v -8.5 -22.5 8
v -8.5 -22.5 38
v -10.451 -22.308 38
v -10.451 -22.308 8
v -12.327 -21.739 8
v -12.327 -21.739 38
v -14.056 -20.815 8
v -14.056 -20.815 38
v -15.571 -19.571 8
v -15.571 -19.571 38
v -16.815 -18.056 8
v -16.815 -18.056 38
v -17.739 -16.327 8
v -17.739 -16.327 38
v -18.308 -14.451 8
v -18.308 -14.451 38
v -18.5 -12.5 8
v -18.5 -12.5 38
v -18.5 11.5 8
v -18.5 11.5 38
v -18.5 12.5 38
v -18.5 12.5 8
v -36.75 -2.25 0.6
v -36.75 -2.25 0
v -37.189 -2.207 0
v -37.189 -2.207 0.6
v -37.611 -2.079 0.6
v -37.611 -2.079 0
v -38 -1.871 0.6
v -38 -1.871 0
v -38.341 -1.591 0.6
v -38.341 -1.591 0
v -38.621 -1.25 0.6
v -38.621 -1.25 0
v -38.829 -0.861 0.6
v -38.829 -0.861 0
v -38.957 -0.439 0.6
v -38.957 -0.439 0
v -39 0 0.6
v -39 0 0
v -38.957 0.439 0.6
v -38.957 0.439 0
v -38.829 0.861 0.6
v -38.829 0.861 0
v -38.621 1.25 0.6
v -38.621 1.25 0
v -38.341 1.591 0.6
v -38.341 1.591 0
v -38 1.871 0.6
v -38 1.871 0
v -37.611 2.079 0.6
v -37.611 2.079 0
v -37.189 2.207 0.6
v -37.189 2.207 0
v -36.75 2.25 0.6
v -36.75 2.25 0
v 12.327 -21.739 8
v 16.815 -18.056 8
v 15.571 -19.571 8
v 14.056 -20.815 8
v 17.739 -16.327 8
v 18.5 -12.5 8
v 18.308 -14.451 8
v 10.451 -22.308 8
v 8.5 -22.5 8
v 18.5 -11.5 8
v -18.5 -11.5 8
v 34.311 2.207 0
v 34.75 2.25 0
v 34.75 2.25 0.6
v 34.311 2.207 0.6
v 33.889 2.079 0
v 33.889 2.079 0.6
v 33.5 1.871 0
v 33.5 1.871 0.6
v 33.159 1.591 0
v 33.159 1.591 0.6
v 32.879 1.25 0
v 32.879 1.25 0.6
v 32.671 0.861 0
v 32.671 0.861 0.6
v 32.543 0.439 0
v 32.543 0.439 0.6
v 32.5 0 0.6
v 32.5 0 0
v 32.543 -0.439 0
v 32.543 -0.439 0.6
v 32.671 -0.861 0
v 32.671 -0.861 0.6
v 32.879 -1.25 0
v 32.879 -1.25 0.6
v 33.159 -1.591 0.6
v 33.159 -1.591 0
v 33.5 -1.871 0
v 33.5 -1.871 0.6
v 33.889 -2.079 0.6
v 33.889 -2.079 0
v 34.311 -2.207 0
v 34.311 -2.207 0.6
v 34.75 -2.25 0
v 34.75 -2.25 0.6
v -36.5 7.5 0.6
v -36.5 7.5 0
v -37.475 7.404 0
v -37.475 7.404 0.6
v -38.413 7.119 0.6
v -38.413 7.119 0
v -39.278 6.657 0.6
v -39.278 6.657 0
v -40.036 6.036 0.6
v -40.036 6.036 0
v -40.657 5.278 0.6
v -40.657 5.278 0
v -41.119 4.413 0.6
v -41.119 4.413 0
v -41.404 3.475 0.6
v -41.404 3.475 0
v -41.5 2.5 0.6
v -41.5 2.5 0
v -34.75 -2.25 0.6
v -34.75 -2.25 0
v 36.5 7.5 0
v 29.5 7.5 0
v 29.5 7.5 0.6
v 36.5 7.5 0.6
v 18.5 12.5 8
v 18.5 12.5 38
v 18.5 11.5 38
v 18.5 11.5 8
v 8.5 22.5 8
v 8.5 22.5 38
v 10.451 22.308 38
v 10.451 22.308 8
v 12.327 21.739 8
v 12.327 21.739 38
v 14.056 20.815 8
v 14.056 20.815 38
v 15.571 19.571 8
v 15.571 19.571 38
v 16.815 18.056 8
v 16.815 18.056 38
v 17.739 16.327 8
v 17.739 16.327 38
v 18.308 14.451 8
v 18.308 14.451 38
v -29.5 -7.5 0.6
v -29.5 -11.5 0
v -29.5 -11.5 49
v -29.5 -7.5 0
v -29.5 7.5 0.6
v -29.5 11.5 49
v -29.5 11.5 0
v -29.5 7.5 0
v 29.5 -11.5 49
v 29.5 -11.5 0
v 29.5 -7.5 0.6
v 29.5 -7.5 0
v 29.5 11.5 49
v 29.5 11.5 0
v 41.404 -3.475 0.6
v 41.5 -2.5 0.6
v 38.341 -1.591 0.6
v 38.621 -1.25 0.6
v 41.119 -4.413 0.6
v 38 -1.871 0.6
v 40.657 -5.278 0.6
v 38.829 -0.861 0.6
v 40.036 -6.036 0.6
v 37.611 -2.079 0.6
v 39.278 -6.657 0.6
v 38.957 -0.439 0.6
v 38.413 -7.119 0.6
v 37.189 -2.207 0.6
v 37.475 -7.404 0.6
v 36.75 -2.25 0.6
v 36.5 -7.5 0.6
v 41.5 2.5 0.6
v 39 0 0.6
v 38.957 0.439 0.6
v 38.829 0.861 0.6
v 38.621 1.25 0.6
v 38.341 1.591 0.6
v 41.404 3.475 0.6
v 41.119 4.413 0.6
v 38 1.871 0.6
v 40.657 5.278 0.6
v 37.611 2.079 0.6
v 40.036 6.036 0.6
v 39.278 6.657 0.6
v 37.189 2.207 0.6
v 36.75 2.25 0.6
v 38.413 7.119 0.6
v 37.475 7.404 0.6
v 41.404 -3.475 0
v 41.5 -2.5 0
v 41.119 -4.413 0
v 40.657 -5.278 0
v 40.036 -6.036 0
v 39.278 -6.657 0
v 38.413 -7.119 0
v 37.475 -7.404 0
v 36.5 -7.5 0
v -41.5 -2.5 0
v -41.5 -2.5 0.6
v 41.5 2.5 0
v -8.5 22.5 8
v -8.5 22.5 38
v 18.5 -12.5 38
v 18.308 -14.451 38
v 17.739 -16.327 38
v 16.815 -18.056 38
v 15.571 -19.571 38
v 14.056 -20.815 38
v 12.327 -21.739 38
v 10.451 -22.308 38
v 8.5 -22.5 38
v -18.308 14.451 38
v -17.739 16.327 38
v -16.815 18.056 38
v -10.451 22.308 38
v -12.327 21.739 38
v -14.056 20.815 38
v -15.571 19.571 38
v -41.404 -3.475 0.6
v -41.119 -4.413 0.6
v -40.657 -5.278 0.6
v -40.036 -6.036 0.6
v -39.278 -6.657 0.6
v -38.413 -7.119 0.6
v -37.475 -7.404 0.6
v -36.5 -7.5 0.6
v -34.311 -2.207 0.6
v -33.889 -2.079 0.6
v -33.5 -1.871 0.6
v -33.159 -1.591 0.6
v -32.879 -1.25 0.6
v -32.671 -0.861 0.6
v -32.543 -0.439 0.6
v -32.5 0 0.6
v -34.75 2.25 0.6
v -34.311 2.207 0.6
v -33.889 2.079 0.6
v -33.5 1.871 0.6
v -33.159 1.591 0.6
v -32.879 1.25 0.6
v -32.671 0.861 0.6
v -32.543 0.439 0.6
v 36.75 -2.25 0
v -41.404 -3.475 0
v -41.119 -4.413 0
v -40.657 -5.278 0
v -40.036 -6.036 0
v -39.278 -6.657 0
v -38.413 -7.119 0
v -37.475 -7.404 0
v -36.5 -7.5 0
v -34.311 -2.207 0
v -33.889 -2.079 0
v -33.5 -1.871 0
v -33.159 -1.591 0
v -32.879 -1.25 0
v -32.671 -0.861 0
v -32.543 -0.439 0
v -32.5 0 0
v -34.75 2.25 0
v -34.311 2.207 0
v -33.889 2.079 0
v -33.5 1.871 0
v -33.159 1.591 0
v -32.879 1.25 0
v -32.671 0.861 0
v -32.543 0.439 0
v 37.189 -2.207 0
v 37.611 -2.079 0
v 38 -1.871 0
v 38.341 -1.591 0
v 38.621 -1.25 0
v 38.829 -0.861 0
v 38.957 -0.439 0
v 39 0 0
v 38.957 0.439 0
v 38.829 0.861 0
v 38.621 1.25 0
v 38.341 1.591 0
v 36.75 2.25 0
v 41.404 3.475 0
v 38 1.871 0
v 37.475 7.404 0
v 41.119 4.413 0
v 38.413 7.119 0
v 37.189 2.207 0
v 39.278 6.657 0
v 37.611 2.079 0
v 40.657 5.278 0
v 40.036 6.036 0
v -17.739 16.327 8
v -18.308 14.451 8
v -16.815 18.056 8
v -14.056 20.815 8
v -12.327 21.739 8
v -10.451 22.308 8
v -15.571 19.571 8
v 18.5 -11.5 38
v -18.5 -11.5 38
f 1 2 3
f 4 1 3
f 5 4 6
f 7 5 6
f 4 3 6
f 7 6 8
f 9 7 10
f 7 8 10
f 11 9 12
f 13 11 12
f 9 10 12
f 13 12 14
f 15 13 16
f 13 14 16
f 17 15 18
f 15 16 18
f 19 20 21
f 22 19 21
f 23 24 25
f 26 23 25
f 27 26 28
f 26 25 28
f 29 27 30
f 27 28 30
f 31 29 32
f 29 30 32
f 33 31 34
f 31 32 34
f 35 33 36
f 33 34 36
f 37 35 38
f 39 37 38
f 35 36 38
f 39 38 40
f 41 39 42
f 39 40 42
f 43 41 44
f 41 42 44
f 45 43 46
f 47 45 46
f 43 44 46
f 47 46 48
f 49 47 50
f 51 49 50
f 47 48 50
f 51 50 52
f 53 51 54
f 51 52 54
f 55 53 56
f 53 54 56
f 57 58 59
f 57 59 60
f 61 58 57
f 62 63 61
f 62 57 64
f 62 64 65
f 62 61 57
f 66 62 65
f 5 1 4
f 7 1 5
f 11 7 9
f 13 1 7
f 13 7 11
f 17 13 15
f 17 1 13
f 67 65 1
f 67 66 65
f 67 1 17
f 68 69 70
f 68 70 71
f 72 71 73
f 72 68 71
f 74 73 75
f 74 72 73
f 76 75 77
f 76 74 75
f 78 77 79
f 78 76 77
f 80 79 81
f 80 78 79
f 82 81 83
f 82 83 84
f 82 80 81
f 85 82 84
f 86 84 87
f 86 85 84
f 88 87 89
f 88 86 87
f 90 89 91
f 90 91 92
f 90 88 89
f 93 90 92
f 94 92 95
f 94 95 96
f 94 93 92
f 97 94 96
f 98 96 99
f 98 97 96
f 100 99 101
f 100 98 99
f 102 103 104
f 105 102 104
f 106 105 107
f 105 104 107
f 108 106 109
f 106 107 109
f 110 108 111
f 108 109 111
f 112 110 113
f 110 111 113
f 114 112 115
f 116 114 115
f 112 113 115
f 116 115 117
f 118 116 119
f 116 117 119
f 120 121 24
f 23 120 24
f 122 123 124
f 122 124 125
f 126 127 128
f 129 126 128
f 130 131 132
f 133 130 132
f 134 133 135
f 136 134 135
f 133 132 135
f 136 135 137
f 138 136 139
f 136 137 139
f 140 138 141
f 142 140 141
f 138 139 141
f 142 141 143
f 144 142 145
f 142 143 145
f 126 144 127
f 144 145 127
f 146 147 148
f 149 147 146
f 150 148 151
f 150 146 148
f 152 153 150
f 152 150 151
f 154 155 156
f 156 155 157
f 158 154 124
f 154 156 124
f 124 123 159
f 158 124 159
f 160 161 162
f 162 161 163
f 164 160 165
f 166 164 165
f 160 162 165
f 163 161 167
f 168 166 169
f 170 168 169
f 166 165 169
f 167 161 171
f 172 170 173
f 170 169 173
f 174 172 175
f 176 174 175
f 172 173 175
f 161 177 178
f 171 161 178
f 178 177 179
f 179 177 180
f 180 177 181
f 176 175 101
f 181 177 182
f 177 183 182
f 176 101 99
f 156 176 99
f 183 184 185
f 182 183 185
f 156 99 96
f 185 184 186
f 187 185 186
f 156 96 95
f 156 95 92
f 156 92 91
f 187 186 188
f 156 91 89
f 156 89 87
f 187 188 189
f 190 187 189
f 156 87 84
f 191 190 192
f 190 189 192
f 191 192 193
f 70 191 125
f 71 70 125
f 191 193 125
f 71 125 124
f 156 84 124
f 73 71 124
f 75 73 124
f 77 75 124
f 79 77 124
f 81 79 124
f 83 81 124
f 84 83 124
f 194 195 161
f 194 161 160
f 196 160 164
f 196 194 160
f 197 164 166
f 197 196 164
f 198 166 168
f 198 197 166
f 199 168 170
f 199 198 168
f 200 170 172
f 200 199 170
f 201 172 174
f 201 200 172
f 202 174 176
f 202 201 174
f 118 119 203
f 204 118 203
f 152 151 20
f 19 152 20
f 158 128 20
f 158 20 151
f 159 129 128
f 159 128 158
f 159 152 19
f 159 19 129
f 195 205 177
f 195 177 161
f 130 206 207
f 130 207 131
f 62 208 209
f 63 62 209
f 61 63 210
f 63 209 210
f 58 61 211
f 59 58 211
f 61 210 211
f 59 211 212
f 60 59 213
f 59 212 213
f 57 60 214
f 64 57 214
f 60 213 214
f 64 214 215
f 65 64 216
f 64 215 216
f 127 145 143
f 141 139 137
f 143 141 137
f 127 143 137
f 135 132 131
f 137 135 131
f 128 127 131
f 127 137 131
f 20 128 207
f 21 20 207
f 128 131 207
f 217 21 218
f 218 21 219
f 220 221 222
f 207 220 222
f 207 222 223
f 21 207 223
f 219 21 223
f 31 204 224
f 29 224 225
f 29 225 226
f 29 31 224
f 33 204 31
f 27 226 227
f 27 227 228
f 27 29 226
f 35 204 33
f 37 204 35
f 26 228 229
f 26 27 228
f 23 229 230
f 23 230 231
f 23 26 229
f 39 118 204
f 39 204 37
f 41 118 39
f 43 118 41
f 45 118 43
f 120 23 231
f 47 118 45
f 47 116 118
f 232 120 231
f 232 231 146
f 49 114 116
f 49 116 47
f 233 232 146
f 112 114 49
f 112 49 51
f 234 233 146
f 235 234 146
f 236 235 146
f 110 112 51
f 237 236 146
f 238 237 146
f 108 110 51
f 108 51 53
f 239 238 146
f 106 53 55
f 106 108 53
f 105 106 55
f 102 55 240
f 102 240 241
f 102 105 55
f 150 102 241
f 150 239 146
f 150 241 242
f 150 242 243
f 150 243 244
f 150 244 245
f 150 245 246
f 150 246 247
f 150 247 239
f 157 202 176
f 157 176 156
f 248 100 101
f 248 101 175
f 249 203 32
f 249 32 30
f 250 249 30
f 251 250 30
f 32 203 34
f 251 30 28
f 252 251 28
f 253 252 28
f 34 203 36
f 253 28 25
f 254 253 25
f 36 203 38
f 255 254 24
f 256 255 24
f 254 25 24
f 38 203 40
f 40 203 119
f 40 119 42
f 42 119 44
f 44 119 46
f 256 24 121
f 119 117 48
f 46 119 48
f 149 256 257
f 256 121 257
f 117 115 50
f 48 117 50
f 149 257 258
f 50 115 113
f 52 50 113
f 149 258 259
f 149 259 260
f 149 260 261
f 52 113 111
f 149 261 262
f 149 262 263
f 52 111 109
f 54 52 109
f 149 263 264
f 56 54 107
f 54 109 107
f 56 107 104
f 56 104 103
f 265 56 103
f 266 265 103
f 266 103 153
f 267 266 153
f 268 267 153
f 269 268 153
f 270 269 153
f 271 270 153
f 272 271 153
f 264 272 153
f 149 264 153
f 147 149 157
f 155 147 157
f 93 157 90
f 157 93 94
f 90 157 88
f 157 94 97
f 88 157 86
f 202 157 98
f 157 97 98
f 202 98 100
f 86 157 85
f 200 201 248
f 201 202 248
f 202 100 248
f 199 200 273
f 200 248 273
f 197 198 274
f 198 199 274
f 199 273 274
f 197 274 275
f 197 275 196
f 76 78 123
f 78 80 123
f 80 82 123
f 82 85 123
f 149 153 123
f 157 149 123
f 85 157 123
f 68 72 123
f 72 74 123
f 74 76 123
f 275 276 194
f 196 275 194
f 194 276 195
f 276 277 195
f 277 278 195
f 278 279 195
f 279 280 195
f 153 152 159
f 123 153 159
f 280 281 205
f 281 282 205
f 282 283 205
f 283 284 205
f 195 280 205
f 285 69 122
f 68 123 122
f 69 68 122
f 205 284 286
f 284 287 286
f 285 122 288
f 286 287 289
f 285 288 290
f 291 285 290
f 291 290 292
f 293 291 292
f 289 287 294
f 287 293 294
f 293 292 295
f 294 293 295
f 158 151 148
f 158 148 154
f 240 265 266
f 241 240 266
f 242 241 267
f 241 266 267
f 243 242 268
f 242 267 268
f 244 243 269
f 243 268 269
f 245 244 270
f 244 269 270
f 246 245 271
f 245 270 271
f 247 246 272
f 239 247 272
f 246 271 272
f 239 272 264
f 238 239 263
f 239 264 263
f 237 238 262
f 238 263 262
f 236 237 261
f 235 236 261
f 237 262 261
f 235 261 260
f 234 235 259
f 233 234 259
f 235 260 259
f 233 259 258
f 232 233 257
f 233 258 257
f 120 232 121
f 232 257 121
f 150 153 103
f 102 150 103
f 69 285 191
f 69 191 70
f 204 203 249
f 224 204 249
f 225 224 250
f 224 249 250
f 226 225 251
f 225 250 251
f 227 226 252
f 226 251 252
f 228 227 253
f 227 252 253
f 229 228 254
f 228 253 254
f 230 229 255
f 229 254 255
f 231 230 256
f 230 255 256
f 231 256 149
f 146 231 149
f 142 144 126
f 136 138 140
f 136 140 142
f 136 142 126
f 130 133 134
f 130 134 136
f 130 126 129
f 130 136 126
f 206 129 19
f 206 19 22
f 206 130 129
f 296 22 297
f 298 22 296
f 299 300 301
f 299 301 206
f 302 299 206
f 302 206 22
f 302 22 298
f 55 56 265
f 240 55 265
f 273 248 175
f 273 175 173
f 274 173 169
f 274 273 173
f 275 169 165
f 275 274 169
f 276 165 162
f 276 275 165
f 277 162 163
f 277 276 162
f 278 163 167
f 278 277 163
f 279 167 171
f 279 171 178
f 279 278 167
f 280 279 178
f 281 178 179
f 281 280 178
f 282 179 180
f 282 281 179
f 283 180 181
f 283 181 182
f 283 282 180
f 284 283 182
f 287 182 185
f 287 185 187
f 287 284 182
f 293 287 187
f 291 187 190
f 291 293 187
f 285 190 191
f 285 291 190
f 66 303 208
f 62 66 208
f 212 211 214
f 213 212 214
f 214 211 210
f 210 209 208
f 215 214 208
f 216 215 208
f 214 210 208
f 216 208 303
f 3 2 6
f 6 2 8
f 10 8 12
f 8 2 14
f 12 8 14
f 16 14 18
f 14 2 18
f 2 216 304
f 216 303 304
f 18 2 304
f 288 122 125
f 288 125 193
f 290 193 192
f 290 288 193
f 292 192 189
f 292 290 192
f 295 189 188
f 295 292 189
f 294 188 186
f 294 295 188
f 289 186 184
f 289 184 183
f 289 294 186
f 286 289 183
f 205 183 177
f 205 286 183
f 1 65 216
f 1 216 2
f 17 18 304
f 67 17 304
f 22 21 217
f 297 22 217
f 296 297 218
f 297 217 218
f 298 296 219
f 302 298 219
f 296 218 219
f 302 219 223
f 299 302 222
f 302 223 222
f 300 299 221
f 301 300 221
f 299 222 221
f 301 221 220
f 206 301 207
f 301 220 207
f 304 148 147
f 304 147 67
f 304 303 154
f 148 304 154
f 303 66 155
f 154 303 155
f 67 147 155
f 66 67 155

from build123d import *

# Parameters (mm, degrees)
SKETCH_1_W      = 59
SKETCH_1_H      = 23
EXTRUDE_1_DEPTH = 49
EXTRUDE_START   = -11
EXTRUDE_2_DEPTH = 30
EXTRUDE_3_DEPTH = 0.6


with BuildPart() as part:
    # 草图1 → 拉伸1 (new body)
    with BuildSketch(Plane.XY):
        Rectangle(SKETCH_1_W, SKETCH_1_H)
    extrude(amount=EXTRUDE_1_DEPTH)

    # 草图2 → 拉伸2 (add)
    with BuildSketch(Plane.XY.offset(49).offset(EXTRUDE_START)):
        with BuildLine():
            Line((-8.5, 22.5), (8.5, 22.5))
            ThreePointArc((8.5, 22.5), (15.571067812, 19.571067812), (18.5, 12.5))
            Line((18.5, 12.5), (18.5, -12.5))
            ThreePointArc((18.5, -12.5), (15.571067812, -19.571067812), (8.5, -22.5))
            Line((8.5, -22.5), (-8.5, -22.5))
            ThreePointArc((-8.5, -22.5), (-15.571067812, -19.571067812), (-18.5, -12.5))
            Line((-18.5, -12.5), (-18.5, 12.5))
            ThreePointArc((-18.5, 12.5), (-15.571067812, 19.571067812), (-8.5, 22.5))
        make_face()
    extrude(amount=-EXTRUDE_2_DEPTH)

    # 草图3 → 拉伸3 (add)
    # profile 1 of 2: a face of its own
    with BuildSketch(Plane(origin=(0, 0, 0), x_dir=(-1, 0, 0), z_dir=(0, 0, -1))):
        with BuildLine():
            Line((-29.5, 7.5), (-36.5, 7.5))
            ThreePointArc((-36.5, 7.5), (-40.035533906, 6.035533906), (-41.5, 2.5))
            Line((-41.5, 2.5), (-41.5, -2.5))
            ThreePointArc((-41.5, -2.5), (-40.035533906, -6.035533906), (-36.5, -7.5))
            Line((-36.5, -7.5), (-29.5, -7.5))
            Line((-29.5, -7.5), (-29.5, 7.5))
        make_face()
        with BuildLine():
            Line((-36.75, 2.25), (-34.75, 2.25))
            ThreePointArc((-34.75, 2.25), (-32.5, 0), (-34.75, -2.25))
            Line((-34.75, -2.25), (-36.75, -2.25))
            ThreePointArc((-36.75, -2.25), (-39, 0), (-36.75, 2.25))
        make_face(mode=Mode.SUBTRACT)
    # profile 2 of 2: a face of its own
    with BuildSketch(Plane(origin=(0, 0, 0), x_dir=(-1, 0, 0), z_dir=(0, 0, -1))):
        with BuildLine():
            Line((41.5, 2.5), (41.5, -2.5))
            ThreePointArc((41.5, -2.5), (40.035533906, -6.035533906), (36.5, -7.5))
            Line((36.5, -7.5), (29.5, -7.5))
            Line((29.5, -7.5), (29.5, 7.5))
            Line((29.5, 7.5), (36.5, 7.5))
            ThreePointArc((36.5, 7.5), (40.035533906, 6.035533906), (41.5, 2.5))
        make_face()
        with BuildLine():
            Line((36.75, 2.25), (34.75, 2.25))
            ThreePointArc((34.75, 2.25), (32.5, 0), (34.75, -2.25))
            Line((34.75, -2.25), (36.75, -2.25))
            ThreePointArc((36.75, -2.25), (39, 0), (36.75, 2.25))
        make_face(mode=Mode.SUBTRACT)
    extrude(amount=-EXTRUDE_3_DEPTH)


solid = part.part
